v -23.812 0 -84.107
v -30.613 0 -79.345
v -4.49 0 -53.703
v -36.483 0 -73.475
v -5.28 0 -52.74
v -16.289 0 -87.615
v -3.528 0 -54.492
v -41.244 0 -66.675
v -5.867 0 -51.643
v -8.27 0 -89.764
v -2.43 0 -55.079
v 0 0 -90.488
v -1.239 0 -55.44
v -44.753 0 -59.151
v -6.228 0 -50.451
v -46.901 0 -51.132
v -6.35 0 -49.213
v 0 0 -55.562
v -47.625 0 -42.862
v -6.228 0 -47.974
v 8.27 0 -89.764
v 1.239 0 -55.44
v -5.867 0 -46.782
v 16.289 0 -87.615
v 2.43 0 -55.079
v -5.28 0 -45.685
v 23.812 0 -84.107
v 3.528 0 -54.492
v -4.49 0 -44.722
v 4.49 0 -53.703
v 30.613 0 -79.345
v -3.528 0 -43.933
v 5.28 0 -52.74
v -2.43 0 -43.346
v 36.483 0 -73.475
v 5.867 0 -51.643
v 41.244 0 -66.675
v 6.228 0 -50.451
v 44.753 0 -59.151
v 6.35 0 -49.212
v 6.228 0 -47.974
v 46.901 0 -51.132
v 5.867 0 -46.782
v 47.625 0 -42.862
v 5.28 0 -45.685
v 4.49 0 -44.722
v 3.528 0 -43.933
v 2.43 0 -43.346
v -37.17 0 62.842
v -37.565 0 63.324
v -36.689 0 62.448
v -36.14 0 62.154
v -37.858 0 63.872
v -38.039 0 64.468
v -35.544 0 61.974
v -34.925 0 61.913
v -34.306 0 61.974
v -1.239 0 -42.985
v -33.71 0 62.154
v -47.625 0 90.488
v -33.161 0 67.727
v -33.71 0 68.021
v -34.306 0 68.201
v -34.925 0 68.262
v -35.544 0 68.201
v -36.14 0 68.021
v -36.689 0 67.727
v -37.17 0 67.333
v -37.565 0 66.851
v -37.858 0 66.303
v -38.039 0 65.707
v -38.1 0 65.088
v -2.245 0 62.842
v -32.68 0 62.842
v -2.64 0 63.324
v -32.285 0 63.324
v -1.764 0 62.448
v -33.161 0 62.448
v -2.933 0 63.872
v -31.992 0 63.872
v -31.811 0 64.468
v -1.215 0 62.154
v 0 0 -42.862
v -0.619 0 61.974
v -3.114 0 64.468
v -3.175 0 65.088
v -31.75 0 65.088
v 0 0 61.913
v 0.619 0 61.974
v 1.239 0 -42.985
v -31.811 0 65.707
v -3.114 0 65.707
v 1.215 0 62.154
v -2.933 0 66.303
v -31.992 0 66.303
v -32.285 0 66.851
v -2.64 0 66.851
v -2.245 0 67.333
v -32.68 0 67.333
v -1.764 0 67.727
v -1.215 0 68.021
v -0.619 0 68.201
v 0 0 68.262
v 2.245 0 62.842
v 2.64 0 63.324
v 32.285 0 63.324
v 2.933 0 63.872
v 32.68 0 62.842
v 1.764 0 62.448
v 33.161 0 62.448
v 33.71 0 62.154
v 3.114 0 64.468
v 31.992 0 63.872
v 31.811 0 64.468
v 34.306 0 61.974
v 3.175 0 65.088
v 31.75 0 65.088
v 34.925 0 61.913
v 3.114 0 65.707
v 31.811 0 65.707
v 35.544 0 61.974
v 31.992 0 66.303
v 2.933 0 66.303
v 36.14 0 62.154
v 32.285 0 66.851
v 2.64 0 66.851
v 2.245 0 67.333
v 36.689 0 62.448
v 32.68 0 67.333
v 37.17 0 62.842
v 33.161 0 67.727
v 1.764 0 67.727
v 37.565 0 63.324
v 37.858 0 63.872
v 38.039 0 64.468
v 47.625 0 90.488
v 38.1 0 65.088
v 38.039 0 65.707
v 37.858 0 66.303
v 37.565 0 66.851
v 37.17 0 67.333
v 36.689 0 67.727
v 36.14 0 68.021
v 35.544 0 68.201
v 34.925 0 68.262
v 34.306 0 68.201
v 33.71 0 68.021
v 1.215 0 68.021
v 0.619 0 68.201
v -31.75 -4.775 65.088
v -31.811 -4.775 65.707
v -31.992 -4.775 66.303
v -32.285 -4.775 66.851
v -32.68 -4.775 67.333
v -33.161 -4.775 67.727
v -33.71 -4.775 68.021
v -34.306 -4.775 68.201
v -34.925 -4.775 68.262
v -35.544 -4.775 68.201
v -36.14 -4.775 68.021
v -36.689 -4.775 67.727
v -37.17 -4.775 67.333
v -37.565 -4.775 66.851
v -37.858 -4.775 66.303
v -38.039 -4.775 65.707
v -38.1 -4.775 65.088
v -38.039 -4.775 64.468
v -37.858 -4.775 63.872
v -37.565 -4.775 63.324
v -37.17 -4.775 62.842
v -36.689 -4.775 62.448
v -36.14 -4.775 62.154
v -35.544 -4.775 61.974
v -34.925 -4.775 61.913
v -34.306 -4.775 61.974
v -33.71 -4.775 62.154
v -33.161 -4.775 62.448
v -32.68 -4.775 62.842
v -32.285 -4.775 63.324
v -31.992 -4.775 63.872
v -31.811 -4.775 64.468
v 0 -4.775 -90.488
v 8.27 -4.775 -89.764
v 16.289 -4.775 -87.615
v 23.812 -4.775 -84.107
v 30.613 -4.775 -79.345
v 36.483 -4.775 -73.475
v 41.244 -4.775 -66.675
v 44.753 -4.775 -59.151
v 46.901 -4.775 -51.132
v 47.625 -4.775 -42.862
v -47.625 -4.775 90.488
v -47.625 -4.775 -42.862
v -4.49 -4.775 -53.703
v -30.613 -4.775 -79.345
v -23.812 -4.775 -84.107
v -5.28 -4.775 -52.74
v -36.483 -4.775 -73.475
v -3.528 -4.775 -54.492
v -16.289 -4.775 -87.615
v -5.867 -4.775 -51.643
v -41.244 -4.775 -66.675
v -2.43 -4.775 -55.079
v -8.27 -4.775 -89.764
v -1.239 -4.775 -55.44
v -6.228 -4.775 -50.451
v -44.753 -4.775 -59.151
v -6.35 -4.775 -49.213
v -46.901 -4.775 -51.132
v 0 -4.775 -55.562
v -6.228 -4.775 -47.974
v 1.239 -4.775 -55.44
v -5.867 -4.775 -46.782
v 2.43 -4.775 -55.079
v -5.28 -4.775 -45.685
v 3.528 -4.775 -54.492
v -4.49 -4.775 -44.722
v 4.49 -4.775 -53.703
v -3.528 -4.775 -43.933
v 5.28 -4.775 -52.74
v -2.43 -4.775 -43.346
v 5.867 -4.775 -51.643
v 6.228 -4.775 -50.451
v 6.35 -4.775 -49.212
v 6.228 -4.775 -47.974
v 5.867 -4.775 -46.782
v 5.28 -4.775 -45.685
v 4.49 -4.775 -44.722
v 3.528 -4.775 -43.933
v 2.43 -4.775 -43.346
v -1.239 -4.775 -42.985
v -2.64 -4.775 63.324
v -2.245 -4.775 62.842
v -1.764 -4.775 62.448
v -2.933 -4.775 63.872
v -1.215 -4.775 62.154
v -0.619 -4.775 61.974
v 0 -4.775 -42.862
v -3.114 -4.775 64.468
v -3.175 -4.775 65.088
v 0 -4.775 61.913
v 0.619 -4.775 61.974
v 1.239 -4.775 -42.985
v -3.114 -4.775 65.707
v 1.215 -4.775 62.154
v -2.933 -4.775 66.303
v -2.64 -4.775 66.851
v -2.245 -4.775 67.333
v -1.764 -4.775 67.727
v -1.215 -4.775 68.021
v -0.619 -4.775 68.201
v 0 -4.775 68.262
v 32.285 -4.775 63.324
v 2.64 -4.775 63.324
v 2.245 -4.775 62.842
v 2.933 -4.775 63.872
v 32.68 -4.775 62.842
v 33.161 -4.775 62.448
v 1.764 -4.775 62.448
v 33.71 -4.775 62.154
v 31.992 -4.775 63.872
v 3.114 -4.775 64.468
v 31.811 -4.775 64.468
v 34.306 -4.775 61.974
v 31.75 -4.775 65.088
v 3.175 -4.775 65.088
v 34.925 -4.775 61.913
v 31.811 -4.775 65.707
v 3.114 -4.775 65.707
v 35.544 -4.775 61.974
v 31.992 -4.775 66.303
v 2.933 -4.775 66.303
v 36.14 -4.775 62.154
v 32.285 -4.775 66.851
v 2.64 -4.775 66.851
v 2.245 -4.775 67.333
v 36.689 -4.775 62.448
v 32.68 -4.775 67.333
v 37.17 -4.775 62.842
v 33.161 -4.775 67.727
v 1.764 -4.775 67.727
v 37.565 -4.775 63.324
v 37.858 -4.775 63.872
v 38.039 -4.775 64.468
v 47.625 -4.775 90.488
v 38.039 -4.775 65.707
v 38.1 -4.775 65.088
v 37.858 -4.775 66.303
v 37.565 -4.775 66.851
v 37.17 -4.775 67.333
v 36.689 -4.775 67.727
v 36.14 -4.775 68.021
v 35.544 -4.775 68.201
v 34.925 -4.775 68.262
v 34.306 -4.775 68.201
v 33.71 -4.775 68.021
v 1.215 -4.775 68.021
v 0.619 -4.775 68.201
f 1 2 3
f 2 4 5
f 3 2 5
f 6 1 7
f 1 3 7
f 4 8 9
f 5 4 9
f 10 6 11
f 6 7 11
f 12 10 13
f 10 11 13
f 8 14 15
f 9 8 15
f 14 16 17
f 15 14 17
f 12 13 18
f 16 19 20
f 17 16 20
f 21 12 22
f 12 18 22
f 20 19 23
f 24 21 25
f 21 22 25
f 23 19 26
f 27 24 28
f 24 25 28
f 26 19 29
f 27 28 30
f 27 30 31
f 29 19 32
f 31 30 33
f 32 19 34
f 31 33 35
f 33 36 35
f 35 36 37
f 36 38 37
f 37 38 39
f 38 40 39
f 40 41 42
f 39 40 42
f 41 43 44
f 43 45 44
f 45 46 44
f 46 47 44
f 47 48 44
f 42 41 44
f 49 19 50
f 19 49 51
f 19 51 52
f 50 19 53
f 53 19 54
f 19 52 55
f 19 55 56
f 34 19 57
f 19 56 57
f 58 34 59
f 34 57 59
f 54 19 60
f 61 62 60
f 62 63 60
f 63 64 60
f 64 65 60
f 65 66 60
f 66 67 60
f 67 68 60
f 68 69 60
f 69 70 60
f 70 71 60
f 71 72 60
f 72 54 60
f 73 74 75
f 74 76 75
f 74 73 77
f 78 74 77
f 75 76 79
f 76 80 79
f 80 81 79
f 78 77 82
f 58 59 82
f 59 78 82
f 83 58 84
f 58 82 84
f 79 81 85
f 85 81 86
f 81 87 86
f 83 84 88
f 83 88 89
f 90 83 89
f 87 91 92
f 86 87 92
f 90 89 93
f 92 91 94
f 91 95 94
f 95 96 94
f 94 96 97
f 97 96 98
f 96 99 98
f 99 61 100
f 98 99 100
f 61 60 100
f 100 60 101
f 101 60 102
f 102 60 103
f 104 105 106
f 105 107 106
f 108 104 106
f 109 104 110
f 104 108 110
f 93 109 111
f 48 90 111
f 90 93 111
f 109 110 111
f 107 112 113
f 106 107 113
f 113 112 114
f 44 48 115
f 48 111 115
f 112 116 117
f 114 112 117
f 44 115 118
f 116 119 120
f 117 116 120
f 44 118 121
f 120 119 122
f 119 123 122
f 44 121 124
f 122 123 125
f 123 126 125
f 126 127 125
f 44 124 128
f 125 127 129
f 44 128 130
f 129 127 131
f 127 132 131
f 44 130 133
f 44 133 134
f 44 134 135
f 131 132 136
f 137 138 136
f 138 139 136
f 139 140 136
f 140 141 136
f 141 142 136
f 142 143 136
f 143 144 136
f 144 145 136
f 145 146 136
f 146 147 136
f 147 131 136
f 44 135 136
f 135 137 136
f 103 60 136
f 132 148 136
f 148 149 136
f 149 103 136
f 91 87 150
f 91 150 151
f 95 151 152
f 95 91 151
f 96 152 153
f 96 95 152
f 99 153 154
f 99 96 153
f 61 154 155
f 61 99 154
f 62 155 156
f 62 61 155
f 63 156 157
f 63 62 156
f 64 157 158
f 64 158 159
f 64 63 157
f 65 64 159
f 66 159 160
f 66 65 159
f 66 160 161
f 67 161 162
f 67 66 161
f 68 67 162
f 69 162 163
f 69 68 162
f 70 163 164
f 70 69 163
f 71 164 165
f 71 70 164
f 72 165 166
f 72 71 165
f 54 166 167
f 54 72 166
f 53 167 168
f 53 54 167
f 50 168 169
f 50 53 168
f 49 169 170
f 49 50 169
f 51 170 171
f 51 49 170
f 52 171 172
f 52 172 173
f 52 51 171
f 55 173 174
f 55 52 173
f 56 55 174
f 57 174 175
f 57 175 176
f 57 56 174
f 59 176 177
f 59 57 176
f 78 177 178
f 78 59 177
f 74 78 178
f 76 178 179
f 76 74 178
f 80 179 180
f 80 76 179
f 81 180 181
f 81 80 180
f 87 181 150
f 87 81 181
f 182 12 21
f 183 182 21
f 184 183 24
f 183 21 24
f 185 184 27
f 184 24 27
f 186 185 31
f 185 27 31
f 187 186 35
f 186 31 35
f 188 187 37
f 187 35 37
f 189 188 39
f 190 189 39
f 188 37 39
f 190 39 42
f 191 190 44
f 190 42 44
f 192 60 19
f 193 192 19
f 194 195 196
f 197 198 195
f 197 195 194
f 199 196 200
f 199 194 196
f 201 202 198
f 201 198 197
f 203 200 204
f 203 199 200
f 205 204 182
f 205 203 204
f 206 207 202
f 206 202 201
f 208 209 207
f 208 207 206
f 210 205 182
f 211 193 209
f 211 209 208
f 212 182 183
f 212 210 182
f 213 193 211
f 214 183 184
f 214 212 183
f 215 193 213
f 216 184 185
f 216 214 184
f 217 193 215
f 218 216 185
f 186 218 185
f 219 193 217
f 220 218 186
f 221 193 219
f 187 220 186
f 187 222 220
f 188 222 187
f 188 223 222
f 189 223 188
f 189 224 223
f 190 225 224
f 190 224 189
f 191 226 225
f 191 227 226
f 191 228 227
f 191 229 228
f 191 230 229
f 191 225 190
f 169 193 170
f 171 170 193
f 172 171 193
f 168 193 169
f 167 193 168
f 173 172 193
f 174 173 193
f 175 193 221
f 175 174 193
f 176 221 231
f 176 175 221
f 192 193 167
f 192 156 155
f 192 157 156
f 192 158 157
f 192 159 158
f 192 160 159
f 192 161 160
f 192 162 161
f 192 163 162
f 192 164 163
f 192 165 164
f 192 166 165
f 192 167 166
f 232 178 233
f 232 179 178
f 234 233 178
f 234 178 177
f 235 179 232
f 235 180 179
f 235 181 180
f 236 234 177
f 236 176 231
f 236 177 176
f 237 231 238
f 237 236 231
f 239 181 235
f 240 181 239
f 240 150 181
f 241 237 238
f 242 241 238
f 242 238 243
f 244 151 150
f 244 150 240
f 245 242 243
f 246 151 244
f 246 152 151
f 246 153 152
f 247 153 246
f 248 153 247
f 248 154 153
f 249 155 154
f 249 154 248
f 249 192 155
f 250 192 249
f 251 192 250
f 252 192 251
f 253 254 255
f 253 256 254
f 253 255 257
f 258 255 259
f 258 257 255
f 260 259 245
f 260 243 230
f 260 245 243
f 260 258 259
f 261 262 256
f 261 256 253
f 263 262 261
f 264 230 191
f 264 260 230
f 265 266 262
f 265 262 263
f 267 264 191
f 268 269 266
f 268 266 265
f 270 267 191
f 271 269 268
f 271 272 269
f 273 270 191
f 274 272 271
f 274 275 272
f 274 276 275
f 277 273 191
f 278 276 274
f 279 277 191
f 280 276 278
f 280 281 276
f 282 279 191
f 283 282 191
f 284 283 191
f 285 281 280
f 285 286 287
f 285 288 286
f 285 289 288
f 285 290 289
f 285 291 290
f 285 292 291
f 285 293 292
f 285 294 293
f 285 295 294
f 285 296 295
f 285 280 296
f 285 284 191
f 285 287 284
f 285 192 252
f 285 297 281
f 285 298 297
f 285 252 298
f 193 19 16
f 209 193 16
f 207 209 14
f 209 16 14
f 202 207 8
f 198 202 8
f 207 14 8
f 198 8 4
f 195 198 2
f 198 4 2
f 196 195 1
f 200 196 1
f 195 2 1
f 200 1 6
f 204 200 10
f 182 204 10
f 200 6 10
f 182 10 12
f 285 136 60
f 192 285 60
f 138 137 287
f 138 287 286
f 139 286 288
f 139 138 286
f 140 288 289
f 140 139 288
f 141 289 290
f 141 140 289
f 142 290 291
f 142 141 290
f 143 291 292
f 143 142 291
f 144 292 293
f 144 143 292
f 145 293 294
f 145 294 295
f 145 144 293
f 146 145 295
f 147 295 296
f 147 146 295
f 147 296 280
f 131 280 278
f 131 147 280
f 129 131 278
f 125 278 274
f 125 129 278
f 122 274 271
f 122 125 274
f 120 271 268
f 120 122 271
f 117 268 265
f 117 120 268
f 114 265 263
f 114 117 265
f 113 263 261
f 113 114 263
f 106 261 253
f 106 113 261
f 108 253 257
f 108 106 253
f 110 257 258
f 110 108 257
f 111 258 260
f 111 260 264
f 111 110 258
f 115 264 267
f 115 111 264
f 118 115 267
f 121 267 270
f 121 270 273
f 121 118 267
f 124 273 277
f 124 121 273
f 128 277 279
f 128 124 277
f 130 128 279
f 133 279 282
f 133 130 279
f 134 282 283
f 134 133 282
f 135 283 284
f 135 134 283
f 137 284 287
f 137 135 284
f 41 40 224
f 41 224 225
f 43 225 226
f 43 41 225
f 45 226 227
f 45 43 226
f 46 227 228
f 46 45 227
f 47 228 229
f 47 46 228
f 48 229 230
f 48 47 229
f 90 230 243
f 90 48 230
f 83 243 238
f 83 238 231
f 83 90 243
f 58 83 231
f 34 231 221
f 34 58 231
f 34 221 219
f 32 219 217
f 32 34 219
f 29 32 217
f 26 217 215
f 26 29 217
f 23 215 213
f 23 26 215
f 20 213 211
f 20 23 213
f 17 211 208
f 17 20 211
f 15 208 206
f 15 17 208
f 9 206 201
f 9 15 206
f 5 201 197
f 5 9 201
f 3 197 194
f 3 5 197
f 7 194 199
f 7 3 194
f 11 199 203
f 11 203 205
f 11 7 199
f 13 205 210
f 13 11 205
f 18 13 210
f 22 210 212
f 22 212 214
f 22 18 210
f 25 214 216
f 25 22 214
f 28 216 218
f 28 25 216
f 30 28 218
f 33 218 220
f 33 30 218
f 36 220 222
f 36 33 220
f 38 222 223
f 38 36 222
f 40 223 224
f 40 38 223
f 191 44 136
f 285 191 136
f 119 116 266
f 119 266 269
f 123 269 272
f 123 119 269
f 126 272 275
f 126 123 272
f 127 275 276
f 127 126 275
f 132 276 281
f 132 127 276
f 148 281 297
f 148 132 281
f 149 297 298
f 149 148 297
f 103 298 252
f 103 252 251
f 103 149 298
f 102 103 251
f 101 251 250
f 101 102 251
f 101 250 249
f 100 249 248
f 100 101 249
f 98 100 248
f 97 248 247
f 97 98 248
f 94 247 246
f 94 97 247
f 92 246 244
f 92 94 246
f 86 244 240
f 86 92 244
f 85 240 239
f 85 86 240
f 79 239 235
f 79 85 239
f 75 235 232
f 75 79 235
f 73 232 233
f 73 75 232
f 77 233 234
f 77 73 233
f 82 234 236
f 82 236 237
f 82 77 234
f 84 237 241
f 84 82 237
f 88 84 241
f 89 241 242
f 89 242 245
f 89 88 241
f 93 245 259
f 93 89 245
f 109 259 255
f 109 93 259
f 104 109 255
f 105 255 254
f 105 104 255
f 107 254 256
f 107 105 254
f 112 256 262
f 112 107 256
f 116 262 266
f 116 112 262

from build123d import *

# Parameters (mm, degrees)
F0_R     = 6.35
F0_R_2   = 3.175
F1_DEPTH = 4.7752


with BuildPart() as f1:
    # F0 (on Front) → F1 (new body)
    with BuildSketch(Plane.XZ):
        with BuildLine():
            Line((47.625, 90.4875), (-47.625, 90.4875))
            Line((-47.625, 90.4875), (-47.625, -42.8625))
            ThreePointArc((-47.625, -42.8625), (-33.67596, -76.53846), (0, -90.4875))
            ThreePointArc((0, -90.4875), (33.67596, -76.53846), (47.625, -42.8625))
            Line((47.625, -42.8625), (47.625, 90.4875))
        make_face()
        with Locations((0, -49.2125)):
            Circle(F0_R, mode=Mode.SUBTRACT)
        with Locations((-34.925, 65.0875)):
            Circle(F0_R_2, mode=Mode.SUBTRACT)
        with Locations((0, 65.0875)):
            Circle(F0_R_2, mode=Mode.SUBTRACT)
        with Locations((34.925, 65.0875)):
            Circle(F0_R_2, mode=Mode.SUBTRACT)
    extrude(amount=F1_DEPTH)


solid = f1.part
